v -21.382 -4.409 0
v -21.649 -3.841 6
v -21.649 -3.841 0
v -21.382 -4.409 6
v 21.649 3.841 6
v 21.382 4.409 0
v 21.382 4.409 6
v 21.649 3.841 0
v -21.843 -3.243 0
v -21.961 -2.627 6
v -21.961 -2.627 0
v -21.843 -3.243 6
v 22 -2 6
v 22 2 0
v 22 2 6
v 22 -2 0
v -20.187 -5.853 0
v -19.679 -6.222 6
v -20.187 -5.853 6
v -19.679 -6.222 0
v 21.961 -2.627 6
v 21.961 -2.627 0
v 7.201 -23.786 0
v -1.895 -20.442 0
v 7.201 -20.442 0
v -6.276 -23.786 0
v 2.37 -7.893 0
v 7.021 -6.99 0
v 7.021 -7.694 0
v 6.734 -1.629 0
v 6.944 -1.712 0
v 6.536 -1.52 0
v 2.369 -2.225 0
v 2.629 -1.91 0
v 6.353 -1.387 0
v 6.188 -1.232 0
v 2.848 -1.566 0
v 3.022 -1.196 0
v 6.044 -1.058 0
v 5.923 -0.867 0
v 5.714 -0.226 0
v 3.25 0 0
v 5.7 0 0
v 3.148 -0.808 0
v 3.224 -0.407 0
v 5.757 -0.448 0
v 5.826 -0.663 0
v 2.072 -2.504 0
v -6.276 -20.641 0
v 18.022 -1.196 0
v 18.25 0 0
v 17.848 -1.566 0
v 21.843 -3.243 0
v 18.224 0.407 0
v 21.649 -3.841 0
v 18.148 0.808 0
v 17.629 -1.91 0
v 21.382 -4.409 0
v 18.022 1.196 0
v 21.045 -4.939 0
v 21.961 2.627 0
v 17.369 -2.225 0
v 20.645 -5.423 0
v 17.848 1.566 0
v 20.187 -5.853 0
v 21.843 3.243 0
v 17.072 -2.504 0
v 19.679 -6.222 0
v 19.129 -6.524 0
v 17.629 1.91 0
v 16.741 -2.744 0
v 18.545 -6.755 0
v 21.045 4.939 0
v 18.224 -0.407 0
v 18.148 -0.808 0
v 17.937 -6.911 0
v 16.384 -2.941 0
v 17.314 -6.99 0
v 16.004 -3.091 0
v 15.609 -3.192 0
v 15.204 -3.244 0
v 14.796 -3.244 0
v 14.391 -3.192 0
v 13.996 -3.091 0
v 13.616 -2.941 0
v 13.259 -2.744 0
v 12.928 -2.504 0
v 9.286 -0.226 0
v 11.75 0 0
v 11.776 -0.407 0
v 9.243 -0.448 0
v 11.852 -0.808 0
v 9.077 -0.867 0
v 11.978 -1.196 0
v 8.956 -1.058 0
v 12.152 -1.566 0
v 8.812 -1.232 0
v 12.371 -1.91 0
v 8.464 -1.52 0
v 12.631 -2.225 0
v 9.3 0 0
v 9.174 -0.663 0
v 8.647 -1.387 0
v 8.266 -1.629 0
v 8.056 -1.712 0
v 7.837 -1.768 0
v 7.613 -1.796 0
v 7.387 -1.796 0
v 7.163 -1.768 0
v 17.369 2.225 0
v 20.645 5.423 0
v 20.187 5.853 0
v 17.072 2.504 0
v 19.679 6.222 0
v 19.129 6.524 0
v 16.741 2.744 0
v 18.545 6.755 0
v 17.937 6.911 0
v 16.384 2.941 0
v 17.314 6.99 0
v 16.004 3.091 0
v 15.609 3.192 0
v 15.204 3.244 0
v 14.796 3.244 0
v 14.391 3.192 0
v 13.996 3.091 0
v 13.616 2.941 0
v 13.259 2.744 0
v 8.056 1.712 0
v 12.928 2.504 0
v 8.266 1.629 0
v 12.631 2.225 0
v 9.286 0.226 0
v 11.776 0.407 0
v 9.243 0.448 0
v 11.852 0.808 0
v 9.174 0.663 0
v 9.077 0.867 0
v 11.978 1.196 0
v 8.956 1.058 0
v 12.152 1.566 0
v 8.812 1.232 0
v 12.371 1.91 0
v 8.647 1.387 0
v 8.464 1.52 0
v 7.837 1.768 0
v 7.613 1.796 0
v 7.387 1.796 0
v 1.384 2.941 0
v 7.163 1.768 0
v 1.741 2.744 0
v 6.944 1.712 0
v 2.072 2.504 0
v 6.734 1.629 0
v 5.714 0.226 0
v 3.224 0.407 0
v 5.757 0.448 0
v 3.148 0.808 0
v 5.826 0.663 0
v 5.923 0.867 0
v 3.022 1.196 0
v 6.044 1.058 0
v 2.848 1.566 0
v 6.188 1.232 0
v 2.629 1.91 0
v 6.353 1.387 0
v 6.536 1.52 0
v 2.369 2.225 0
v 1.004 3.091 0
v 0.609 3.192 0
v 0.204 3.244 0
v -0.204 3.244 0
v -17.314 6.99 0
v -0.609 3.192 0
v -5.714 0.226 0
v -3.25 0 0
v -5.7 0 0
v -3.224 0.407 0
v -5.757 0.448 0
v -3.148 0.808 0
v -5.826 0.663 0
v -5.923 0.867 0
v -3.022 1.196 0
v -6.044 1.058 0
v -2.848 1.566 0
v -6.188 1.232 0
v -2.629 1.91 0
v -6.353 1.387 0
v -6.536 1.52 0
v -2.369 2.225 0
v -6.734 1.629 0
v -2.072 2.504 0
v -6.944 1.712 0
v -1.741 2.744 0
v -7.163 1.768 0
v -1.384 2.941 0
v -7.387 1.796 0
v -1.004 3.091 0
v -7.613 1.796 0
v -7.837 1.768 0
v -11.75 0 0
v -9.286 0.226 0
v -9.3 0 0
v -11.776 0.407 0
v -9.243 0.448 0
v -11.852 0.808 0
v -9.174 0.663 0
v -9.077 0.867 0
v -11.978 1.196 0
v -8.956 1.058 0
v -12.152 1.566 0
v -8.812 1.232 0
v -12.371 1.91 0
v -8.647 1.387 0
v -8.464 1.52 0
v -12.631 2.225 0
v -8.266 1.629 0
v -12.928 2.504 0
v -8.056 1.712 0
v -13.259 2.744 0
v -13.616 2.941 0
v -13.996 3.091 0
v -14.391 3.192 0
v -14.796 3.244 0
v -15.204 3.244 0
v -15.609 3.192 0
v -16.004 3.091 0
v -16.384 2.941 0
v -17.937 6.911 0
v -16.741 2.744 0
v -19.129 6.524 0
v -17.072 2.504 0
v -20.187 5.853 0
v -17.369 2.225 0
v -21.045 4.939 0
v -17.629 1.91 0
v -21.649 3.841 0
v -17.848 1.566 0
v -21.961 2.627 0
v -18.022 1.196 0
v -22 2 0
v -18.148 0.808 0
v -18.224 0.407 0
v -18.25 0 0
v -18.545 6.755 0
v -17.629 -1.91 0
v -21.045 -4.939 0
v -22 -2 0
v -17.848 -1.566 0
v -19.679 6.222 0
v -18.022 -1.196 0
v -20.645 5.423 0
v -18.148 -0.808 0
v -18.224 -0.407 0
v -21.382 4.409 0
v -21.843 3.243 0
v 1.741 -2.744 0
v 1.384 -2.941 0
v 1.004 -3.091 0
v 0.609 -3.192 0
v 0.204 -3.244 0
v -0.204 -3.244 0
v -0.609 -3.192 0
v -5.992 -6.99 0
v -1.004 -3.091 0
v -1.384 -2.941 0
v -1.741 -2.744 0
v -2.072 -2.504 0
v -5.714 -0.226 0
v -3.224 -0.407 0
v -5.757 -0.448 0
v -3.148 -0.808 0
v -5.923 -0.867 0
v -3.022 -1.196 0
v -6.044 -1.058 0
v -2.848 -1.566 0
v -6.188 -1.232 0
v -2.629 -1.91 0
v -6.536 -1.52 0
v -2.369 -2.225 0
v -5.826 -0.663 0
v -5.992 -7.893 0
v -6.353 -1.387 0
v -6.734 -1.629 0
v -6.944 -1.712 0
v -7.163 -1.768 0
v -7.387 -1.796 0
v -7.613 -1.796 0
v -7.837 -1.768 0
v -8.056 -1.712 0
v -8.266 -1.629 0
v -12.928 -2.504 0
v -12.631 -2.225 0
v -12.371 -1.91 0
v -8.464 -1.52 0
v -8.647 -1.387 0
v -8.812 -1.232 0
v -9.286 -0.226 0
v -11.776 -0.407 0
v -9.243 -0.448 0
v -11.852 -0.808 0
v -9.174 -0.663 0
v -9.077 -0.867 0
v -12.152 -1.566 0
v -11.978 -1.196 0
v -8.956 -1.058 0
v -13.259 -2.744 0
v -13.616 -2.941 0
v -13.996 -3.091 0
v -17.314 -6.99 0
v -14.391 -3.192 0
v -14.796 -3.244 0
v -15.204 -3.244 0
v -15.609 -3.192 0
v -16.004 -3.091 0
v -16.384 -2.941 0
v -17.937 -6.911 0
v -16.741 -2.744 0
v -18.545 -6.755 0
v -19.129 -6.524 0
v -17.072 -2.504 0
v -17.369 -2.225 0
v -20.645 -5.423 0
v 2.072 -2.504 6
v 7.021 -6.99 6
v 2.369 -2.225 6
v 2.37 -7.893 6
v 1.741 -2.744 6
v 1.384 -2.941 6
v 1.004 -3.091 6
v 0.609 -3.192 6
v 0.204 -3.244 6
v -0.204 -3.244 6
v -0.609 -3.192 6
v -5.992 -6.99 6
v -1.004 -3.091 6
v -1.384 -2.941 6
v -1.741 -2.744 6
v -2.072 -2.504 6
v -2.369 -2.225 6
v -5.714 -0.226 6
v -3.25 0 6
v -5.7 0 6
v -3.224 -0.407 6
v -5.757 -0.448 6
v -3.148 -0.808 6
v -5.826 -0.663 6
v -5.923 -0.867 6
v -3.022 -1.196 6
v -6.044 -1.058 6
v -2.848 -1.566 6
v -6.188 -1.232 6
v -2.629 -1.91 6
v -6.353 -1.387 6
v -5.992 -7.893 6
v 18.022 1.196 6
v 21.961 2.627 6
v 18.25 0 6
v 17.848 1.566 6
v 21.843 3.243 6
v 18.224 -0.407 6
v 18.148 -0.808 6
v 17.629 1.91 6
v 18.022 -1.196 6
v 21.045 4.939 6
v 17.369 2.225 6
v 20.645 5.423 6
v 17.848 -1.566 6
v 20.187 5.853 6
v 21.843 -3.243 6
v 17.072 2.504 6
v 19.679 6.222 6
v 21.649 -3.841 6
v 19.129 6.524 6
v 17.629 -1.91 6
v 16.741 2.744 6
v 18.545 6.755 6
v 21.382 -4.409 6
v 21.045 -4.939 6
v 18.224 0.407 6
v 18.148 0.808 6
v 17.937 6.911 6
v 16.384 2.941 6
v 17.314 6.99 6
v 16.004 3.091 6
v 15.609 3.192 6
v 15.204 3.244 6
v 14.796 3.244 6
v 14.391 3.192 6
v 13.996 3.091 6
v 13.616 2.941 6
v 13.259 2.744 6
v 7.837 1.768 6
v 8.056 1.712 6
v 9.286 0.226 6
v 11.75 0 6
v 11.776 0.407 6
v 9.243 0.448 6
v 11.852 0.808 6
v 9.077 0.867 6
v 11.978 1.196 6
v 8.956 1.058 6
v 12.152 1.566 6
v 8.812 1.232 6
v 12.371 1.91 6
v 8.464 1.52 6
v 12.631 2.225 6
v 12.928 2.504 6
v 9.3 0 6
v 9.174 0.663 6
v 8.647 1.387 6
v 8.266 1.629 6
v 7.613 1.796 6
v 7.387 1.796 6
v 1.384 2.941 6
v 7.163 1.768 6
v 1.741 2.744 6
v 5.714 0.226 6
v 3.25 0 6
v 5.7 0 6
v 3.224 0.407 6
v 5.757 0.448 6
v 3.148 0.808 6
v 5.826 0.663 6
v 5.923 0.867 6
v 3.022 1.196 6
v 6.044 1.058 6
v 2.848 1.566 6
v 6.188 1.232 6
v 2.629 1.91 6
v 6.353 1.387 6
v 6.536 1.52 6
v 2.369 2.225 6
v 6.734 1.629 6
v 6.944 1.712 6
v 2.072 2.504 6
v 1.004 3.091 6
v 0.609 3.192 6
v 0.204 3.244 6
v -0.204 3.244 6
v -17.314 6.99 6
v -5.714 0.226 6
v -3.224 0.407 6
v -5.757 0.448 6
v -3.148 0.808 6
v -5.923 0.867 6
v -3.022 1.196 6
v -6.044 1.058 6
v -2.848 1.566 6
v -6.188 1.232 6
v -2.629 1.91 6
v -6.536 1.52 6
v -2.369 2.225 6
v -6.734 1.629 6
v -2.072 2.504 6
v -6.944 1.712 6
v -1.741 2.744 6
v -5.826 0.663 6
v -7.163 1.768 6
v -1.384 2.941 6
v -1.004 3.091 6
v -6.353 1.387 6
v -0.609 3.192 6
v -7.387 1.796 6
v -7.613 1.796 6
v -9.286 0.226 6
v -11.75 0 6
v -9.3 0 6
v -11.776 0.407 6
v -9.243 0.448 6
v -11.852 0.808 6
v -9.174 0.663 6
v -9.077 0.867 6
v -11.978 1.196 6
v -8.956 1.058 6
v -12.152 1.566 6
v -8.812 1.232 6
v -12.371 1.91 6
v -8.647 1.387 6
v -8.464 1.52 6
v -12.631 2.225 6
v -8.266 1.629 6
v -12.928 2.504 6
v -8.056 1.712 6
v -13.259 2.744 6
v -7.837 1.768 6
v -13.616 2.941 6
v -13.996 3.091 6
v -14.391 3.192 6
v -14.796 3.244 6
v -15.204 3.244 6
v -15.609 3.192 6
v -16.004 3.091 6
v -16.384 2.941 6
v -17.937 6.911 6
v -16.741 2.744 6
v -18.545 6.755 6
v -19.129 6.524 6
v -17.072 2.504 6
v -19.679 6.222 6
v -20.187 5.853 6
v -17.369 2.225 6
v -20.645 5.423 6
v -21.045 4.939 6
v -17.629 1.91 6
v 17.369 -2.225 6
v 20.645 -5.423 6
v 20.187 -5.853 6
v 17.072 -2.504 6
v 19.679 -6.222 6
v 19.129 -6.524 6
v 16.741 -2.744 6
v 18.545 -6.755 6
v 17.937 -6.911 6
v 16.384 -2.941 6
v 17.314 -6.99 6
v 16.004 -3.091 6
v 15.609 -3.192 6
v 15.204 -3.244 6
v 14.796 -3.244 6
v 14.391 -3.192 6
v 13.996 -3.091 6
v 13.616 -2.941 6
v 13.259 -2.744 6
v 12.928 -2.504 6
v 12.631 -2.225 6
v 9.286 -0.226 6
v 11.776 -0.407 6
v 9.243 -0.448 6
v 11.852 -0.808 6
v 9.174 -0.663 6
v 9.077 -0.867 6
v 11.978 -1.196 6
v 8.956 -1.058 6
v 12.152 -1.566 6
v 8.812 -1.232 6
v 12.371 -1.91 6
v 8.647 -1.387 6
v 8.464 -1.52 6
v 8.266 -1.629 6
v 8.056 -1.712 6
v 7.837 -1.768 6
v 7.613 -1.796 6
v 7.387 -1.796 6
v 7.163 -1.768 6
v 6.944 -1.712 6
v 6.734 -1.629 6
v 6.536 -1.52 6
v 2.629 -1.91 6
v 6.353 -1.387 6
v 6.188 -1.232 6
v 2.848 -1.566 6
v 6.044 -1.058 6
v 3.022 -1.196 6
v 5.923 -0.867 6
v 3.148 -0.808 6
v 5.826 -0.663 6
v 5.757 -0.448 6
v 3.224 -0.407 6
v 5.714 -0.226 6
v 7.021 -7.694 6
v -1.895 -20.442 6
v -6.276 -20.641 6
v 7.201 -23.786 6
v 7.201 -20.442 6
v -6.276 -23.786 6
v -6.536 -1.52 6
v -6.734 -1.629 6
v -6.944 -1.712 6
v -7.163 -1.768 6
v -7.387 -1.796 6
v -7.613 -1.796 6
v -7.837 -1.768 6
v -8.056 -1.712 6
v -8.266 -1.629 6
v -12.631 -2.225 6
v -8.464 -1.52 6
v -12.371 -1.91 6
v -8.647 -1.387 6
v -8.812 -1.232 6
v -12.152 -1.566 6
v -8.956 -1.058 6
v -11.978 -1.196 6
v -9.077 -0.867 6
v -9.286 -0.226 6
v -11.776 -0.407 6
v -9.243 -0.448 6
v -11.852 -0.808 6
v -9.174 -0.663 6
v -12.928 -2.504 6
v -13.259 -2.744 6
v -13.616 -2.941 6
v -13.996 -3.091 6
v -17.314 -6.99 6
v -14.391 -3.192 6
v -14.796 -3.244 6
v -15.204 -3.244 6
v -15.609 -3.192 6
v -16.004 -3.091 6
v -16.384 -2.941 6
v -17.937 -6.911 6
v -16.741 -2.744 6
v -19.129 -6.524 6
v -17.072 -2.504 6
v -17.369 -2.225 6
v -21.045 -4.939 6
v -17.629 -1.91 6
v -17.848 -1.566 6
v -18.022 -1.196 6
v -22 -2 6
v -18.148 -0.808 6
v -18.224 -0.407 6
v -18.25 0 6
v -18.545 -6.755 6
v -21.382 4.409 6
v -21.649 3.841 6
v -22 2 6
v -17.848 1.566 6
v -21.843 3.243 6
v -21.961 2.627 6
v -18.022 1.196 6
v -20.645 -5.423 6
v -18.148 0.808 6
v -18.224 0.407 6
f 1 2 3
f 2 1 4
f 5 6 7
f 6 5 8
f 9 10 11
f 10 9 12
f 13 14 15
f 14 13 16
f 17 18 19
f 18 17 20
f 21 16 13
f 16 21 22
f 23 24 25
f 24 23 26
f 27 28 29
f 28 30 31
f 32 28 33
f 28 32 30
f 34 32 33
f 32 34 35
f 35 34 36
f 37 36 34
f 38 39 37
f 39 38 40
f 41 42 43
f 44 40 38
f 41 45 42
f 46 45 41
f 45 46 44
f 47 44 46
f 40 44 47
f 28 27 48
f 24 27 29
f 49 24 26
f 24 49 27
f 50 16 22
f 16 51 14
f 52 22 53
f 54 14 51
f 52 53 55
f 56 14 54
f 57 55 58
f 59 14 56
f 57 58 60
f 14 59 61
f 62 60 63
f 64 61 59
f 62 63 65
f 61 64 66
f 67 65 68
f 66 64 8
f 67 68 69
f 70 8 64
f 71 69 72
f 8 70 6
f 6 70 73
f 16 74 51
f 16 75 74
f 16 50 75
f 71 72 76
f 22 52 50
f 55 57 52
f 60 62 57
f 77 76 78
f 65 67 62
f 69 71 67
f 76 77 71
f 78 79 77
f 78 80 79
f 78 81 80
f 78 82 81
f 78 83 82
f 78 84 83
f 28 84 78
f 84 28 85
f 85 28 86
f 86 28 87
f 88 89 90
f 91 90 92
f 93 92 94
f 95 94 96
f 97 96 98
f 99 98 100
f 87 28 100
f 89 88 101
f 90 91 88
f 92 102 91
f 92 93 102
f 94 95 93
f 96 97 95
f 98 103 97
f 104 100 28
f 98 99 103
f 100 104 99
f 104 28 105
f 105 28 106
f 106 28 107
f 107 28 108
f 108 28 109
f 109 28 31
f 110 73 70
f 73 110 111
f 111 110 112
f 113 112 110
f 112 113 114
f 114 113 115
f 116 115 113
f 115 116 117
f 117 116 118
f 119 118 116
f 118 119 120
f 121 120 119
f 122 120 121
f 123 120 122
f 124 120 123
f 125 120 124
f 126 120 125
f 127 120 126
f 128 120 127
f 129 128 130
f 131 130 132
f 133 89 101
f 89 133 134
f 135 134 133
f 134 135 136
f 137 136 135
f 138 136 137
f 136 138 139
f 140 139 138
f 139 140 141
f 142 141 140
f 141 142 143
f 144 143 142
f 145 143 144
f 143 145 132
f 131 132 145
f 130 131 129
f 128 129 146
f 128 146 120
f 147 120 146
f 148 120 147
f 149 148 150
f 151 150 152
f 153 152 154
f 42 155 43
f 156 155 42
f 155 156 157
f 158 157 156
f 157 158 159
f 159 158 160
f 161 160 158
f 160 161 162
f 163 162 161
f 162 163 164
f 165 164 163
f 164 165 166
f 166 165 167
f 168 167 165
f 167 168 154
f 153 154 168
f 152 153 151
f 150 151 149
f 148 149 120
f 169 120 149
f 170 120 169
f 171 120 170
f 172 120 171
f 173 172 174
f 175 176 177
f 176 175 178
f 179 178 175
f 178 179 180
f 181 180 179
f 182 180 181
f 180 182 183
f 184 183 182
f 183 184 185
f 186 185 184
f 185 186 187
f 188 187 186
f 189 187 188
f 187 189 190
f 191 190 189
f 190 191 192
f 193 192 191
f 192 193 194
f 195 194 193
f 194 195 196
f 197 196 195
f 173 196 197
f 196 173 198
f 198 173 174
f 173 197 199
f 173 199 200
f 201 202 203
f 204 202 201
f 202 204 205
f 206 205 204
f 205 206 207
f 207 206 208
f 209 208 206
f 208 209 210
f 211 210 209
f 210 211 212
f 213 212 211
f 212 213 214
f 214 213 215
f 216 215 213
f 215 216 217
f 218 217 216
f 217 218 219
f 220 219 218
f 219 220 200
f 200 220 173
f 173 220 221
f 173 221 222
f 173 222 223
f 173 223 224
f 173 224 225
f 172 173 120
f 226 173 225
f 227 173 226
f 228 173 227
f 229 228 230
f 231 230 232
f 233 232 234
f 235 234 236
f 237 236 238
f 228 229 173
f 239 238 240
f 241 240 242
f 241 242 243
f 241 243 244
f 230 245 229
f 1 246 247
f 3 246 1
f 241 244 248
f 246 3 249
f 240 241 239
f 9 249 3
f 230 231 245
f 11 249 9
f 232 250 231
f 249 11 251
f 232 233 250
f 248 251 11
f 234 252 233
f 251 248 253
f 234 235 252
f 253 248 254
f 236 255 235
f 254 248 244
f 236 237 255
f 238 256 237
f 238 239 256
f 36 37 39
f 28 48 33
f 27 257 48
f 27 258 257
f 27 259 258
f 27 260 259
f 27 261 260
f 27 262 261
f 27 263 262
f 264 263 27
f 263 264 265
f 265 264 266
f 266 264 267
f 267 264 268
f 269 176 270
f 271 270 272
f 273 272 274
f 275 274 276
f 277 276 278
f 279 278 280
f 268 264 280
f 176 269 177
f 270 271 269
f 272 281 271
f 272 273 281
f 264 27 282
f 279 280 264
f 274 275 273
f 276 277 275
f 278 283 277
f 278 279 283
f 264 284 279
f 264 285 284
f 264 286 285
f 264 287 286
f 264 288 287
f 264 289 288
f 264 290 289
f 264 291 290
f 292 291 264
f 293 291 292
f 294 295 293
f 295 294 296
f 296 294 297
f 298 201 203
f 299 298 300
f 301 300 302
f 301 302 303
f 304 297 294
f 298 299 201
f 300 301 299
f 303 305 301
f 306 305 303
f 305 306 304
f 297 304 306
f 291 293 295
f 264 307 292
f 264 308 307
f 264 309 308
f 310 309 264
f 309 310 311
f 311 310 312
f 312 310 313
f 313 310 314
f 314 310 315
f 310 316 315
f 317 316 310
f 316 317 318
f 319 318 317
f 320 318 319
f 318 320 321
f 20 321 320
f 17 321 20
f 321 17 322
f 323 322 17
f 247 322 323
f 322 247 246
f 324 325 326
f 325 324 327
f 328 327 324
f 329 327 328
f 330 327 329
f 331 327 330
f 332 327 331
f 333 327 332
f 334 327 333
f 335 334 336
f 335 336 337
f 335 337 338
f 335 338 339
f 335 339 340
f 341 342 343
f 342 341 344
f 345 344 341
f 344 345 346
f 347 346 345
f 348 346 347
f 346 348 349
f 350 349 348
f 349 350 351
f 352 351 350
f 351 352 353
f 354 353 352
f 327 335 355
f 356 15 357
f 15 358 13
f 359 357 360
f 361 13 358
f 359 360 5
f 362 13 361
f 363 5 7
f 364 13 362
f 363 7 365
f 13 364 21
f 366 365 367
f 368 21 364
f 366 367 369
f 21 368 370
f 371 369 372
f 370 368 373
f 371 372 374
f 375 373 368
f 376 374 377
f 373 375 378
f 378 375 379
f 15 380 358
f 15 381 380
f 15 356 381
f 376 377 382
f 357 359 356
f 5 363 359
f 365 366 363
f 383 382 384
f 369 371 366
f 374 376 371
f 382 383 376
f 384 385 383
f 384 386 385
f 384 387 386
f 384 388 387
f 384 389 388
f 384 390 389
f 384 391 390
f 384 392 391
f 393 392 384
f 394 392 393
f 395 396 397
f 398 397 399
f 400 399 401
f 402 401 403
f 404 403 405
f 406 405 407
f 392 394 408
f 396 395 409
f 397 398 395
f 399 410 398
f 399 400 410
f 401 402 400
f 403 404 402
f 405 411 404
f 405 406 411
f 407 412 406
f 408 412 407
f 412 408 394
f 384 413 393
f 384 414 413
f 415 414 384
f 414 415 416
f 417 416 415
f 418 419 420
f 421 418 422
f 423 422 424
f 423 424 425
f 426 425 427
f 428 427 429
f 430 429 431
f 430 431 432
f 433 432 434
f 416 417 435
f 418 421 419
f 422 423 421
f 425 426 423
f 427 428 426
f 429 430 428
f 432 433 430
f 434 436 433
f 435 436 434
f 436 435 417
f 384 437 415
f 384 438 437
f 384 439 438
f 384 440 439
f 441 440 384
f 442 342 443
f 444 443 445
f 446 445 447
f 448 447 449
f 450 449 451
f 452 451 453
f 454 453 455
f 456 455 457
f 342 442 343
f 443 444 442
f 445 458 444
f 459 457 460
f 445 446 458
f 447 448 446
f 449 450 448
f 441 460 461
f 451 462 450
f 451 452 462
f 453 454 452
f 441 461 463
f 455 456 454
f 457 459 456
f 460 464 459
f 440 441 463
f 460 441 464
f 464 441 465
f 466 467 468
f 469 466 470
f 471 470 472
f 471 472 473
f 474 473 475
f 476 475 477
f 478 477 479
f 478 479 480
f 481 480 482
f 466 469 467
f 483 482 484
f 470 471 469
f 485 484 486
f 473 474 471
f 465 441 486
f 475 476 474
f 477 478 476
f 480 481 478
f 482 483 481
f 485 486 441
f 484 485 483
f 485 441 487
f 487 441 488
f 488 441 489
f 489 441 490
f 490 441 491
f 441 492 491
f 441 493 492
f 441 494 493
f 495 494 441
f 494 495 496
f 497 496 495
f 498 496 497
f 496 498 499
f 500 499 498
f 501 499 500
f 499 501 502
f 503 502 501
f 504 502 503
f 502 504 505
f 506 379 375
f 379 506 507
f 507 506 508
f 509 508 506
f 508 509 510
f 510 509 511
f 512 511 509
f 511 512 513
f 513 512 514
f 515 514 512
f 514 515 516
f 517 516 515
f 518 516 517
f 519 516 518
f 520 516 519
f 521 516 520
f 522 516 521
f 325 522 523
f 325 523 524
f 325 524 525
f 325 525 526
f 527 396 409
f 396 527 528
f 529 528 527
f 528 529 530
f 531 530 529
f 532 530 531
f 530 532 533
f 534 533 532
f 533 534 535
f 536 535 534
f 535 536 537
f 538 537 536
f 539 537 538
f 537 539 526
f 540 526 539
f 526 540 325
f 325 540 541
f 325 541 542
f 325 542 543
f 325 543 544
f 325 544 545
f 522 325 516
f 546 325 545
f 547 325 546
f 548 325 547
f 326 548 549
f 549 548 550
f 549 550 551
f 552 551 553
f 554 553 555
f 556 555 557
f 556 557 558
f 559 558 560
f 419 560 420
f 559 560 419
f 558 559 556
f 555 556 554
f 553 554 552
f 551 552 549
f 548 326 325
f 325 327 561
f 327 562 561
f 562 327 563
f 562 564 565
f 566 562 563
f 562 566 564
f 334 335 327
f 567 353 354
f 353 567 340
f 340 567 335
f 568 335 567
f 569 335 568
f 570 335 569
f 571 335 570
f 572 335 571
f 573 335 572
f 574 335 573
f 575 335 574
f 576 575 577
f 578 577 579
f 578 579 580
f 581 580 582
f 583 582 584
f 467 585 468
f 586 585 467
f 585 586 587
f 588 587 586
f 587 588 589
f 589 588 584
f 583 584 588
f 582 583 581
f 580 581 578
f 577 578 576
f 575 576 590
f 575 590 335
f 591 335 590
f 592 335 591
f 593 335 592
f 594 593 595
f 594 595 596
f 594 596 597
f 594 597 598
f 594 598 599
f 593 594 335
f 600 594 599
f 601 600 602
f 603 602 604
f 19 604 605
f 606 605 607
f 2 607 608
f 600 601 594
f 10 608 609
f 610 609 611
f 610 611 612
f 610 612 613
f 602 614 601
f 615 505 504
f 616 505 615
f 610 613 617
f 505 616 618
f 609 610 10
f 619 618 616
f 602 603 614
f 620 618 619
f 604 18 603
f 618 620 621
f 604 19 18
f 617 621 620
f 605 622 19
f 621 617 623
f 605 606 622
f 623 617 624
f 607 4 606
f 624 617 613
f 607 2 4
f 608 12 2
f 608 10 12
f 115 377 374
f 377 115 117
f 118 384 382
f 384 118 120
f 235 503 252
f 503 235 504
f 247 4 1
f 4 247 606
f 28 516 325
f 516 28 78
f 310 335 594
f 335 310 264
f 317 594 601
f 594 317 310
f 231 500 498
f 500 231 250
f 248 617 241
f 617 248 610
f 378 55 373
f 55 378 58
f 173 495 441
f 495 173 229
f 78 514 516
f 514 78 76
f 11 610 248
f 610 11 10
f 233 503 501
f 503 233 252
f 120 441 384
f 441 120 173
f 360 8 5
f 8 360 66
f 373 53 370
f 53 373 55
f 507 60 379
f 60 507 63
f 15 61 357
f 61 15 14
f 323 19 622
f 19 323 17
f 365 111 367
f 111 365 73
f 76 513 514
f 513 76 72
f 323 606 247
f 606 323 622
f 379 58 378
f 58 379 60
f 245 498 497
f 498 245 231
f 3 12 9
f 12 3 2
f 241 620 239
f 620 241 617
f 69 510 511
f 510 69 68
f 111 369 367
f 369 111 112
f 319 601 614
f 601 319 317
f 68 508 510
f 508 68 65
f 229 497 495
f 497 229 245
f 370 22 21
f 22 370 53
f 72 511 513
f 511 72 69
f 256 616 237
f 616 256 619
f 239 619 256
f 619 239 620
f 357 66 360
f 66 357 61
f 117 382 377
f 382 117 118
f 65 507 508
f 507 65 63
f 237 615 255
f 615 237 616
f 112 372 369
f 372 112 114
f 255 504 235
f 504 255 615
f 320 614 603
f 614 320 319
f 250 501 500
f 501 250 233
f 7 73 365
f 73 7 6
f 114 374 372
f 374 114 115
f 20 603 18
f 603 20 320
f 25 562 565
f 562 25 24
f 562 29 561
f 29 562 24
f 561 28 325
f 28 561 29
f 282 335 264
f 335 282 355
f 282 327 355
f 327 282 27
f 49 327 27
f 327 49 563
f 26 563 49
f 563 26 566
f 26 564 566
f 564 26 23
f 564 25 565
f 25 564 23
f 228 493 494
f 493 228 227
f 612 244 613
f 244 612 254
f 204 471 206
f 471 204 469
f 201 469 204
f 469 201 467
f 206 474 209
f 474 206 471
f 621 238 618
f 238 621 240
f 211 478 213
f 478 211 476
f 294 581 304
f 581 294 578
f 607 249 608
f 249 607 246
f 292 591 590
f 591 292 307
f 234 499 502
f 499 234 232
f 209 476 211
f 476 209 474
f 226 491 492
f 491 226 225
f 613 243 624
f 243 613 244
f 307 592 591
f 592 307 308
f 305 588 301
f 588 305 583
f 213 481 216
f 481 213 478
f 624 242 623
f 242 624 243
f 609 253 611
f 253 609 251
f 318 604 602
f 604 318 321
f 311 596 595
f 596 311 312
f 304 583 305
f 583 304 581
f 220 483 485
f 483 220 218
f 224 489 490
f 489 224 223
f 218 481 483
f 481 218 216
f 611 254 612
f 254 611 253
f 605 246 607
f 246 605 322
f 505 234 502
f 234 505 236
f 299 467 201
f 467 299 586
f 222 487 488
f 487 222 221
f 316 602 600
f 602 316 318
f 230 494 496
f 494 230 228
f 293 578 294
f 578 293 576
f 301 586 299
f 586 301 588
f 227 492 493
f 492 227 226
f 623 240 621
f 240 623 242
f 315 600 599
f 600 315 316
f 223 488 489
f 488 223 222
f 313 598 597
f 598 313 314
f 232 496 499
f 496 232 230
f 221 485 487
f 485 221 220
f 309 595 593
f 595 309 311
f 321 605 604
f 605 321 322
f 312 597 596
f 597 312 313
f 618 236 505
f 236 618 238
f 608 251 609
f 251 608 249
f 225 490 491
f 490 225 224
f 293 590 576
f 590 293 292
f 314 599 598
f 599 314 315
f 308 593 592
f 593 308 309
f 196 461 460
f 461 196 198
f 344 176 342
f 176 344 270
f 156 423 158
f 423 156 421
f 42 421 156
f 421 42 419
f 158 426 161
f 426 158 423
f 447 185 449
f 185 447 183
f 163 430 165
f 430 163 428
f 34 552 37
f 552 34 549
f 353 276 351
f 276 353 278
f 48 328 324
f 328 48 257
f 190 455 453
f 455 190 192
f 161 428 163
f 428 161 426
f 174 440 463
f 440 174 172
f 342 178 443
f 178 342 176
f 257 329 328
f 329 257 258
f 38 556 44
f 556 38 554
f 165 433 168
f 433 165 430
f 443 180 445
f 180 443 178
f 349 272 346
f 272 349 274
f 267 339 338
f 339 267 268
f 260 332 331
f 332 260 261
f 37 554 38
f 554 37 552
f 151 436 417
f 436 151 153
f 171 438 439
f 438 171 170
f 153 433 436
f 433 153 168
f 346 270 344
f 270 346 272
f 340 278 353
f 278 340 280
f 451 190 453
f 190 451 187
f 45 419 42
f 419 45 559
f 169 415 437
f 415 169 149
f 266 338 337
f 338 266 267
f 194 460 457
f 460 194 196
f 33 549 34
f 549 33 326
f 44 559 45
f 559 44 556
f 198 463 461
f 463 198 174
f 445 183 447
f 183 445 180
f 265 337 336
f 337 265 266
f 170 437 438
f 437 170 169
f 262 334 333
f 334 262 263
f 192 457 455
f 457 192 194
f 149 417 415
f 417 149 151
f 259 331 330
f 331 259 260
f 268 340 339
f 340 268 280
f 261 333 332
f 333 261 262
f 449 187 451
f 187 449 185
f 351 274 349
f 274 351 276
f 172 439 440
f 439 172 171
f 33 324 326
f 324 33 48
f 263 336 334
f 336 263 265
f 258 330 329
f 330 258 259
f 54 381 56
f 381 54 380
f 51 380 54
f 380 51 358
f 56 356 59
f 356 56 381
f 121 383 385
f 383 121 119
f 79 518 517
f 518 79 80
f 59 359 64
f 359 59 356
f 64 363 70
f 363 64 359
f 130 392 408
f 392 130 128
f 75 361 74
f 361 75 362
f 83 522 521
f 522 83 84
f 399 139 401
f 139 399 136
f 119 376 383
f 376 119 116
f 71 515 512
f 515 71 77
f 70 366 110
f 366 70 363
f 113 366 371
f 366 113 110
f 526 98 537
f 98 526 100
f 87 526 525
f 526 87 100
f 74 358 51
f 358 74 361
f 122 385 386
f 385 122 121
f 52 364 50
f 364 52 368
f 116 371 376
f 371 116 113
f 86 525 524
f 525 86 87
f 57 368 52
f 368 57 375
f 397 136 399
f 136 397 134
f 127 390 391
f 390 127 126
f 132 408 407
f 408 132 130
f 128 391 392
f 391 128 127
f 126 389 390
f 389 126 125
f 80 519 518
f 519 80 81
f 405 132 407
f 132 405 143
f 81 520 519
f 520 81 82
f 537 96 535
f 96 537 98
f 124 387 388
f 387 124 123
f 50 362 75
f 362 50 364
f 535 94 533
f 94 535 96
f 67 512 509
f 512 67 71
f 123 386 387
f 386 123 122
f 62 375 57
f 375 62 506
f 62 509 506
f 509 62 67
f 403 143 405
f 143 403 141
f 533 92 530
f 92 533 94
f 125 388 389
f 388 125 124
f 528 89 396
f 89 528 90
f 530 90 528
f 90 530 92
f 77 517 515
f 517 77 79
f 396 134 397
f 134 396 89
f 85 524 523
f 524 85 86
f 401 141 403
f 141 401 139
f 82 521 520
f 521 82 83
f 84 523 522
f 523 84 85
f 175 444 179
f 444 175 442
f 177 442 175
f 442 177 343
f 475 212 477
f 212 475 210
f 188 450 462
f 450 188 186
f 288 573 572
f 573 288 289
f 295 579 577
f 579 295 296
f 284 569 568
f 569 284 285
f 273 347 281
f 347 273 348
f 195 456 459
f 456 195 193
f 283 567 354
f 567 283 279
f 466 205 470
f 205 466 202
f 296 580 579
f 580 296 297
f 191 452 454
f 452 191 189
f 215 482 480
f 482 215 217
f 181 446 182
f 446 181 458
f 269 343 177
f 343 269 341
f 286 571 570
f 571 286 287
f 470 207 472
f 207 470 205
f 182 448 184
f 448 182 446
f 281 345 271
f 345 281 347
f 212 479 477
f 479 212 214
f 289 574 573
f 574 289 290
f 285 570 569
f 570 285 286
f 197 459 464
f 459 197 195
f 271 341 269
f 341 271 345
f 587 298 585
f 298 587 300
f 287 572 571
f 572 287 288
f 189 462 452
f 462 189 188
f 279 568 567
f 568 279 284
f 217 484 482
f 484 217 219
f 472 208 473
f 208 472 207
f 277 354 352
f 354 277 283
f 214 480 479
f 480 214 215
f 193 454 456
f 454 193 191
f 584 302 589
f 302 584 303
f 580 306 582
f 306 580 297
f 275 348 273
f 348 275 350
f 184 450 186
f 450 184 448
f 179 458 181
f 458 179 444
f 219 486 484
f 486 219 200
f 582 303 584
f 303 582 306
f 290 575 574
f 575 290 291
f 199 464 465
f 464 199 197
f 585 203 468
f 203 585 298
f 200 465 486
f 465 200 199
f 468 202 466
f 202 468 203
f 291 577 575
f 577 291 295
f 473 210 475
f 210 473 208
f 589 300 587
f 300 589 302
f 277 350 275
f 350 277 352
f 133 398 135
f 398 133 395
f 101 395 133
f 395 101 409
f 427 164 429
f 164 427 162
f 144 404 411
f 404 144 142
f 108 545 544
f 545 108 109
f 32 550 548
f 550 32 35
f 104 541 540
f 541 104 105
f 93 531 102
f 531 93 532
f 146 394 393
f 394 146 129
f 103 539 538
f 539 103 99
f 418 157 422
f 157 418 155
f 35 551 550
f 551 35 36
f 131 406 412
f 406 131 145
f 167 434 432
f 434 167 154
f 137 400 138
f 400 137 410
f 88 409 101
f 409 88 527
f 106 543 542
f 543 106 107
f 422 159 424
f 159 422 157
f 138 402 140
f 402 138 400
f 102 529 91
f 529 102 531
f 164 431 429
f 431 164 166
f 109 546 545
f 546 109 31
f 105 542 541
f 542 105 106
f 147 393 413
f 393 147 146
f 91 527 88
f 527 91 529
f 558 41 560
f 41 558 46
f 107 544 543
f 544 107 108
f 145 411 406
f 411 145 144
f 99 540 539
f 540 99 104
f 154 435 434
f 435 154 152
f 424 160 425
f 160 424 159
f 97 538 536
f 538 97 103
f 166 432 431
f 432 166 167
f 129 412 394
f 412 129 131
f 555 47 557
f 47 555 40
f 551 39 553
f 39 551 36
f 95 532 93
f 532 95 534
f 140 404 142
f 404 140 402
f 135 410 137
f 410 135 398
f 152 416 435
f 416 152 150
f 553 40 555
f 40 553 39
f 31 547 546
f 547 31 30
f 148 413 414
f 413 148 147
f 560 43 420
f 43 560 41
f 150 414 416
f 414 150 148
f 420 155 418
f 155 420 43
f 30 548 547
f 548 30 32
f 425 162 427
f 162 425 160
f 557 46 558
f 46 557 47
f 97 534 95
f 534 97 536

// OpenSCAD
$fn = 50;


difference() {
	union() {
		hull() {
			translate(v = [-17.0000000000, 2.0000000000, 0]) {
				cylinder(h = 6, r = 5);
			}
			translate(v = [17.0000000000, 2.0000000000, 0]) {
				cylinder(h = 6, r = 5);
			}
			translate(v = [-17.0000000000, -2.0000000000, 0]) {
				cylinder(h = 6, r = 5);
			}
			translate(v = [17.0000000000, -2.0000000000, 0]) {
				cylinder(h = 6, r = 5);
			}
		}
		translate(v = [0, -5, 0]) {
			linear_extrude(height = 6) {
				text(font = "DejaVu Sans Mono:style=Bold", halign = "center", size = 19.0000000000, text = "Z", valign = "top");
			}
		}
	}
	union() {
		translate(v = [-15.0000000000, 0.0000000000, 0]) {
			translate(v = [0, 0, -100]) {
				cylinder(h = 200, r = 3.2500000000);
			}
		}
		translate(v = [0, 0, -100]) {
			cylinder(h = 200, r = 3.2500000000);
		}
		translate(v = [15.0000000000, 0.0000000000, 0]) {
			translate(v = [0, 0, -100]) {
				cylinder(h = 200, r = 3.2500000000);
			}
		}
		translate(v = [-15.0000000000, 0.0000000000, 0]) {
			translate(v = [0, 0, -100]) {
				cylinder(h = 200, r = 1.8000000000);
			}
		}
		translate(v = [-7.5000000000, 0.0000000000, 0]) {
			translate(v = [0, 0, -100]) {
				cylinder(h = 200, r = 1.8000000000);
			}
		}
		translate(v = [0, 0, -100]) {
			cylinder(h = 200, r = 1.8000000000);
		}
		translate(v = [7.5000000000, 0.0000000000, 0]) {
			translate(v = [0, 0, -100]) {
				cylinder(h = 200, r = 1.8000000000);
			}
		}
		translate(v = [15.0000000000, 0.0000000000, 0]) {
			translate(v = [0, 0, -100]) {
				cylinder(h = 200, r = 1.8000000000);
			}
		}
	}
}
